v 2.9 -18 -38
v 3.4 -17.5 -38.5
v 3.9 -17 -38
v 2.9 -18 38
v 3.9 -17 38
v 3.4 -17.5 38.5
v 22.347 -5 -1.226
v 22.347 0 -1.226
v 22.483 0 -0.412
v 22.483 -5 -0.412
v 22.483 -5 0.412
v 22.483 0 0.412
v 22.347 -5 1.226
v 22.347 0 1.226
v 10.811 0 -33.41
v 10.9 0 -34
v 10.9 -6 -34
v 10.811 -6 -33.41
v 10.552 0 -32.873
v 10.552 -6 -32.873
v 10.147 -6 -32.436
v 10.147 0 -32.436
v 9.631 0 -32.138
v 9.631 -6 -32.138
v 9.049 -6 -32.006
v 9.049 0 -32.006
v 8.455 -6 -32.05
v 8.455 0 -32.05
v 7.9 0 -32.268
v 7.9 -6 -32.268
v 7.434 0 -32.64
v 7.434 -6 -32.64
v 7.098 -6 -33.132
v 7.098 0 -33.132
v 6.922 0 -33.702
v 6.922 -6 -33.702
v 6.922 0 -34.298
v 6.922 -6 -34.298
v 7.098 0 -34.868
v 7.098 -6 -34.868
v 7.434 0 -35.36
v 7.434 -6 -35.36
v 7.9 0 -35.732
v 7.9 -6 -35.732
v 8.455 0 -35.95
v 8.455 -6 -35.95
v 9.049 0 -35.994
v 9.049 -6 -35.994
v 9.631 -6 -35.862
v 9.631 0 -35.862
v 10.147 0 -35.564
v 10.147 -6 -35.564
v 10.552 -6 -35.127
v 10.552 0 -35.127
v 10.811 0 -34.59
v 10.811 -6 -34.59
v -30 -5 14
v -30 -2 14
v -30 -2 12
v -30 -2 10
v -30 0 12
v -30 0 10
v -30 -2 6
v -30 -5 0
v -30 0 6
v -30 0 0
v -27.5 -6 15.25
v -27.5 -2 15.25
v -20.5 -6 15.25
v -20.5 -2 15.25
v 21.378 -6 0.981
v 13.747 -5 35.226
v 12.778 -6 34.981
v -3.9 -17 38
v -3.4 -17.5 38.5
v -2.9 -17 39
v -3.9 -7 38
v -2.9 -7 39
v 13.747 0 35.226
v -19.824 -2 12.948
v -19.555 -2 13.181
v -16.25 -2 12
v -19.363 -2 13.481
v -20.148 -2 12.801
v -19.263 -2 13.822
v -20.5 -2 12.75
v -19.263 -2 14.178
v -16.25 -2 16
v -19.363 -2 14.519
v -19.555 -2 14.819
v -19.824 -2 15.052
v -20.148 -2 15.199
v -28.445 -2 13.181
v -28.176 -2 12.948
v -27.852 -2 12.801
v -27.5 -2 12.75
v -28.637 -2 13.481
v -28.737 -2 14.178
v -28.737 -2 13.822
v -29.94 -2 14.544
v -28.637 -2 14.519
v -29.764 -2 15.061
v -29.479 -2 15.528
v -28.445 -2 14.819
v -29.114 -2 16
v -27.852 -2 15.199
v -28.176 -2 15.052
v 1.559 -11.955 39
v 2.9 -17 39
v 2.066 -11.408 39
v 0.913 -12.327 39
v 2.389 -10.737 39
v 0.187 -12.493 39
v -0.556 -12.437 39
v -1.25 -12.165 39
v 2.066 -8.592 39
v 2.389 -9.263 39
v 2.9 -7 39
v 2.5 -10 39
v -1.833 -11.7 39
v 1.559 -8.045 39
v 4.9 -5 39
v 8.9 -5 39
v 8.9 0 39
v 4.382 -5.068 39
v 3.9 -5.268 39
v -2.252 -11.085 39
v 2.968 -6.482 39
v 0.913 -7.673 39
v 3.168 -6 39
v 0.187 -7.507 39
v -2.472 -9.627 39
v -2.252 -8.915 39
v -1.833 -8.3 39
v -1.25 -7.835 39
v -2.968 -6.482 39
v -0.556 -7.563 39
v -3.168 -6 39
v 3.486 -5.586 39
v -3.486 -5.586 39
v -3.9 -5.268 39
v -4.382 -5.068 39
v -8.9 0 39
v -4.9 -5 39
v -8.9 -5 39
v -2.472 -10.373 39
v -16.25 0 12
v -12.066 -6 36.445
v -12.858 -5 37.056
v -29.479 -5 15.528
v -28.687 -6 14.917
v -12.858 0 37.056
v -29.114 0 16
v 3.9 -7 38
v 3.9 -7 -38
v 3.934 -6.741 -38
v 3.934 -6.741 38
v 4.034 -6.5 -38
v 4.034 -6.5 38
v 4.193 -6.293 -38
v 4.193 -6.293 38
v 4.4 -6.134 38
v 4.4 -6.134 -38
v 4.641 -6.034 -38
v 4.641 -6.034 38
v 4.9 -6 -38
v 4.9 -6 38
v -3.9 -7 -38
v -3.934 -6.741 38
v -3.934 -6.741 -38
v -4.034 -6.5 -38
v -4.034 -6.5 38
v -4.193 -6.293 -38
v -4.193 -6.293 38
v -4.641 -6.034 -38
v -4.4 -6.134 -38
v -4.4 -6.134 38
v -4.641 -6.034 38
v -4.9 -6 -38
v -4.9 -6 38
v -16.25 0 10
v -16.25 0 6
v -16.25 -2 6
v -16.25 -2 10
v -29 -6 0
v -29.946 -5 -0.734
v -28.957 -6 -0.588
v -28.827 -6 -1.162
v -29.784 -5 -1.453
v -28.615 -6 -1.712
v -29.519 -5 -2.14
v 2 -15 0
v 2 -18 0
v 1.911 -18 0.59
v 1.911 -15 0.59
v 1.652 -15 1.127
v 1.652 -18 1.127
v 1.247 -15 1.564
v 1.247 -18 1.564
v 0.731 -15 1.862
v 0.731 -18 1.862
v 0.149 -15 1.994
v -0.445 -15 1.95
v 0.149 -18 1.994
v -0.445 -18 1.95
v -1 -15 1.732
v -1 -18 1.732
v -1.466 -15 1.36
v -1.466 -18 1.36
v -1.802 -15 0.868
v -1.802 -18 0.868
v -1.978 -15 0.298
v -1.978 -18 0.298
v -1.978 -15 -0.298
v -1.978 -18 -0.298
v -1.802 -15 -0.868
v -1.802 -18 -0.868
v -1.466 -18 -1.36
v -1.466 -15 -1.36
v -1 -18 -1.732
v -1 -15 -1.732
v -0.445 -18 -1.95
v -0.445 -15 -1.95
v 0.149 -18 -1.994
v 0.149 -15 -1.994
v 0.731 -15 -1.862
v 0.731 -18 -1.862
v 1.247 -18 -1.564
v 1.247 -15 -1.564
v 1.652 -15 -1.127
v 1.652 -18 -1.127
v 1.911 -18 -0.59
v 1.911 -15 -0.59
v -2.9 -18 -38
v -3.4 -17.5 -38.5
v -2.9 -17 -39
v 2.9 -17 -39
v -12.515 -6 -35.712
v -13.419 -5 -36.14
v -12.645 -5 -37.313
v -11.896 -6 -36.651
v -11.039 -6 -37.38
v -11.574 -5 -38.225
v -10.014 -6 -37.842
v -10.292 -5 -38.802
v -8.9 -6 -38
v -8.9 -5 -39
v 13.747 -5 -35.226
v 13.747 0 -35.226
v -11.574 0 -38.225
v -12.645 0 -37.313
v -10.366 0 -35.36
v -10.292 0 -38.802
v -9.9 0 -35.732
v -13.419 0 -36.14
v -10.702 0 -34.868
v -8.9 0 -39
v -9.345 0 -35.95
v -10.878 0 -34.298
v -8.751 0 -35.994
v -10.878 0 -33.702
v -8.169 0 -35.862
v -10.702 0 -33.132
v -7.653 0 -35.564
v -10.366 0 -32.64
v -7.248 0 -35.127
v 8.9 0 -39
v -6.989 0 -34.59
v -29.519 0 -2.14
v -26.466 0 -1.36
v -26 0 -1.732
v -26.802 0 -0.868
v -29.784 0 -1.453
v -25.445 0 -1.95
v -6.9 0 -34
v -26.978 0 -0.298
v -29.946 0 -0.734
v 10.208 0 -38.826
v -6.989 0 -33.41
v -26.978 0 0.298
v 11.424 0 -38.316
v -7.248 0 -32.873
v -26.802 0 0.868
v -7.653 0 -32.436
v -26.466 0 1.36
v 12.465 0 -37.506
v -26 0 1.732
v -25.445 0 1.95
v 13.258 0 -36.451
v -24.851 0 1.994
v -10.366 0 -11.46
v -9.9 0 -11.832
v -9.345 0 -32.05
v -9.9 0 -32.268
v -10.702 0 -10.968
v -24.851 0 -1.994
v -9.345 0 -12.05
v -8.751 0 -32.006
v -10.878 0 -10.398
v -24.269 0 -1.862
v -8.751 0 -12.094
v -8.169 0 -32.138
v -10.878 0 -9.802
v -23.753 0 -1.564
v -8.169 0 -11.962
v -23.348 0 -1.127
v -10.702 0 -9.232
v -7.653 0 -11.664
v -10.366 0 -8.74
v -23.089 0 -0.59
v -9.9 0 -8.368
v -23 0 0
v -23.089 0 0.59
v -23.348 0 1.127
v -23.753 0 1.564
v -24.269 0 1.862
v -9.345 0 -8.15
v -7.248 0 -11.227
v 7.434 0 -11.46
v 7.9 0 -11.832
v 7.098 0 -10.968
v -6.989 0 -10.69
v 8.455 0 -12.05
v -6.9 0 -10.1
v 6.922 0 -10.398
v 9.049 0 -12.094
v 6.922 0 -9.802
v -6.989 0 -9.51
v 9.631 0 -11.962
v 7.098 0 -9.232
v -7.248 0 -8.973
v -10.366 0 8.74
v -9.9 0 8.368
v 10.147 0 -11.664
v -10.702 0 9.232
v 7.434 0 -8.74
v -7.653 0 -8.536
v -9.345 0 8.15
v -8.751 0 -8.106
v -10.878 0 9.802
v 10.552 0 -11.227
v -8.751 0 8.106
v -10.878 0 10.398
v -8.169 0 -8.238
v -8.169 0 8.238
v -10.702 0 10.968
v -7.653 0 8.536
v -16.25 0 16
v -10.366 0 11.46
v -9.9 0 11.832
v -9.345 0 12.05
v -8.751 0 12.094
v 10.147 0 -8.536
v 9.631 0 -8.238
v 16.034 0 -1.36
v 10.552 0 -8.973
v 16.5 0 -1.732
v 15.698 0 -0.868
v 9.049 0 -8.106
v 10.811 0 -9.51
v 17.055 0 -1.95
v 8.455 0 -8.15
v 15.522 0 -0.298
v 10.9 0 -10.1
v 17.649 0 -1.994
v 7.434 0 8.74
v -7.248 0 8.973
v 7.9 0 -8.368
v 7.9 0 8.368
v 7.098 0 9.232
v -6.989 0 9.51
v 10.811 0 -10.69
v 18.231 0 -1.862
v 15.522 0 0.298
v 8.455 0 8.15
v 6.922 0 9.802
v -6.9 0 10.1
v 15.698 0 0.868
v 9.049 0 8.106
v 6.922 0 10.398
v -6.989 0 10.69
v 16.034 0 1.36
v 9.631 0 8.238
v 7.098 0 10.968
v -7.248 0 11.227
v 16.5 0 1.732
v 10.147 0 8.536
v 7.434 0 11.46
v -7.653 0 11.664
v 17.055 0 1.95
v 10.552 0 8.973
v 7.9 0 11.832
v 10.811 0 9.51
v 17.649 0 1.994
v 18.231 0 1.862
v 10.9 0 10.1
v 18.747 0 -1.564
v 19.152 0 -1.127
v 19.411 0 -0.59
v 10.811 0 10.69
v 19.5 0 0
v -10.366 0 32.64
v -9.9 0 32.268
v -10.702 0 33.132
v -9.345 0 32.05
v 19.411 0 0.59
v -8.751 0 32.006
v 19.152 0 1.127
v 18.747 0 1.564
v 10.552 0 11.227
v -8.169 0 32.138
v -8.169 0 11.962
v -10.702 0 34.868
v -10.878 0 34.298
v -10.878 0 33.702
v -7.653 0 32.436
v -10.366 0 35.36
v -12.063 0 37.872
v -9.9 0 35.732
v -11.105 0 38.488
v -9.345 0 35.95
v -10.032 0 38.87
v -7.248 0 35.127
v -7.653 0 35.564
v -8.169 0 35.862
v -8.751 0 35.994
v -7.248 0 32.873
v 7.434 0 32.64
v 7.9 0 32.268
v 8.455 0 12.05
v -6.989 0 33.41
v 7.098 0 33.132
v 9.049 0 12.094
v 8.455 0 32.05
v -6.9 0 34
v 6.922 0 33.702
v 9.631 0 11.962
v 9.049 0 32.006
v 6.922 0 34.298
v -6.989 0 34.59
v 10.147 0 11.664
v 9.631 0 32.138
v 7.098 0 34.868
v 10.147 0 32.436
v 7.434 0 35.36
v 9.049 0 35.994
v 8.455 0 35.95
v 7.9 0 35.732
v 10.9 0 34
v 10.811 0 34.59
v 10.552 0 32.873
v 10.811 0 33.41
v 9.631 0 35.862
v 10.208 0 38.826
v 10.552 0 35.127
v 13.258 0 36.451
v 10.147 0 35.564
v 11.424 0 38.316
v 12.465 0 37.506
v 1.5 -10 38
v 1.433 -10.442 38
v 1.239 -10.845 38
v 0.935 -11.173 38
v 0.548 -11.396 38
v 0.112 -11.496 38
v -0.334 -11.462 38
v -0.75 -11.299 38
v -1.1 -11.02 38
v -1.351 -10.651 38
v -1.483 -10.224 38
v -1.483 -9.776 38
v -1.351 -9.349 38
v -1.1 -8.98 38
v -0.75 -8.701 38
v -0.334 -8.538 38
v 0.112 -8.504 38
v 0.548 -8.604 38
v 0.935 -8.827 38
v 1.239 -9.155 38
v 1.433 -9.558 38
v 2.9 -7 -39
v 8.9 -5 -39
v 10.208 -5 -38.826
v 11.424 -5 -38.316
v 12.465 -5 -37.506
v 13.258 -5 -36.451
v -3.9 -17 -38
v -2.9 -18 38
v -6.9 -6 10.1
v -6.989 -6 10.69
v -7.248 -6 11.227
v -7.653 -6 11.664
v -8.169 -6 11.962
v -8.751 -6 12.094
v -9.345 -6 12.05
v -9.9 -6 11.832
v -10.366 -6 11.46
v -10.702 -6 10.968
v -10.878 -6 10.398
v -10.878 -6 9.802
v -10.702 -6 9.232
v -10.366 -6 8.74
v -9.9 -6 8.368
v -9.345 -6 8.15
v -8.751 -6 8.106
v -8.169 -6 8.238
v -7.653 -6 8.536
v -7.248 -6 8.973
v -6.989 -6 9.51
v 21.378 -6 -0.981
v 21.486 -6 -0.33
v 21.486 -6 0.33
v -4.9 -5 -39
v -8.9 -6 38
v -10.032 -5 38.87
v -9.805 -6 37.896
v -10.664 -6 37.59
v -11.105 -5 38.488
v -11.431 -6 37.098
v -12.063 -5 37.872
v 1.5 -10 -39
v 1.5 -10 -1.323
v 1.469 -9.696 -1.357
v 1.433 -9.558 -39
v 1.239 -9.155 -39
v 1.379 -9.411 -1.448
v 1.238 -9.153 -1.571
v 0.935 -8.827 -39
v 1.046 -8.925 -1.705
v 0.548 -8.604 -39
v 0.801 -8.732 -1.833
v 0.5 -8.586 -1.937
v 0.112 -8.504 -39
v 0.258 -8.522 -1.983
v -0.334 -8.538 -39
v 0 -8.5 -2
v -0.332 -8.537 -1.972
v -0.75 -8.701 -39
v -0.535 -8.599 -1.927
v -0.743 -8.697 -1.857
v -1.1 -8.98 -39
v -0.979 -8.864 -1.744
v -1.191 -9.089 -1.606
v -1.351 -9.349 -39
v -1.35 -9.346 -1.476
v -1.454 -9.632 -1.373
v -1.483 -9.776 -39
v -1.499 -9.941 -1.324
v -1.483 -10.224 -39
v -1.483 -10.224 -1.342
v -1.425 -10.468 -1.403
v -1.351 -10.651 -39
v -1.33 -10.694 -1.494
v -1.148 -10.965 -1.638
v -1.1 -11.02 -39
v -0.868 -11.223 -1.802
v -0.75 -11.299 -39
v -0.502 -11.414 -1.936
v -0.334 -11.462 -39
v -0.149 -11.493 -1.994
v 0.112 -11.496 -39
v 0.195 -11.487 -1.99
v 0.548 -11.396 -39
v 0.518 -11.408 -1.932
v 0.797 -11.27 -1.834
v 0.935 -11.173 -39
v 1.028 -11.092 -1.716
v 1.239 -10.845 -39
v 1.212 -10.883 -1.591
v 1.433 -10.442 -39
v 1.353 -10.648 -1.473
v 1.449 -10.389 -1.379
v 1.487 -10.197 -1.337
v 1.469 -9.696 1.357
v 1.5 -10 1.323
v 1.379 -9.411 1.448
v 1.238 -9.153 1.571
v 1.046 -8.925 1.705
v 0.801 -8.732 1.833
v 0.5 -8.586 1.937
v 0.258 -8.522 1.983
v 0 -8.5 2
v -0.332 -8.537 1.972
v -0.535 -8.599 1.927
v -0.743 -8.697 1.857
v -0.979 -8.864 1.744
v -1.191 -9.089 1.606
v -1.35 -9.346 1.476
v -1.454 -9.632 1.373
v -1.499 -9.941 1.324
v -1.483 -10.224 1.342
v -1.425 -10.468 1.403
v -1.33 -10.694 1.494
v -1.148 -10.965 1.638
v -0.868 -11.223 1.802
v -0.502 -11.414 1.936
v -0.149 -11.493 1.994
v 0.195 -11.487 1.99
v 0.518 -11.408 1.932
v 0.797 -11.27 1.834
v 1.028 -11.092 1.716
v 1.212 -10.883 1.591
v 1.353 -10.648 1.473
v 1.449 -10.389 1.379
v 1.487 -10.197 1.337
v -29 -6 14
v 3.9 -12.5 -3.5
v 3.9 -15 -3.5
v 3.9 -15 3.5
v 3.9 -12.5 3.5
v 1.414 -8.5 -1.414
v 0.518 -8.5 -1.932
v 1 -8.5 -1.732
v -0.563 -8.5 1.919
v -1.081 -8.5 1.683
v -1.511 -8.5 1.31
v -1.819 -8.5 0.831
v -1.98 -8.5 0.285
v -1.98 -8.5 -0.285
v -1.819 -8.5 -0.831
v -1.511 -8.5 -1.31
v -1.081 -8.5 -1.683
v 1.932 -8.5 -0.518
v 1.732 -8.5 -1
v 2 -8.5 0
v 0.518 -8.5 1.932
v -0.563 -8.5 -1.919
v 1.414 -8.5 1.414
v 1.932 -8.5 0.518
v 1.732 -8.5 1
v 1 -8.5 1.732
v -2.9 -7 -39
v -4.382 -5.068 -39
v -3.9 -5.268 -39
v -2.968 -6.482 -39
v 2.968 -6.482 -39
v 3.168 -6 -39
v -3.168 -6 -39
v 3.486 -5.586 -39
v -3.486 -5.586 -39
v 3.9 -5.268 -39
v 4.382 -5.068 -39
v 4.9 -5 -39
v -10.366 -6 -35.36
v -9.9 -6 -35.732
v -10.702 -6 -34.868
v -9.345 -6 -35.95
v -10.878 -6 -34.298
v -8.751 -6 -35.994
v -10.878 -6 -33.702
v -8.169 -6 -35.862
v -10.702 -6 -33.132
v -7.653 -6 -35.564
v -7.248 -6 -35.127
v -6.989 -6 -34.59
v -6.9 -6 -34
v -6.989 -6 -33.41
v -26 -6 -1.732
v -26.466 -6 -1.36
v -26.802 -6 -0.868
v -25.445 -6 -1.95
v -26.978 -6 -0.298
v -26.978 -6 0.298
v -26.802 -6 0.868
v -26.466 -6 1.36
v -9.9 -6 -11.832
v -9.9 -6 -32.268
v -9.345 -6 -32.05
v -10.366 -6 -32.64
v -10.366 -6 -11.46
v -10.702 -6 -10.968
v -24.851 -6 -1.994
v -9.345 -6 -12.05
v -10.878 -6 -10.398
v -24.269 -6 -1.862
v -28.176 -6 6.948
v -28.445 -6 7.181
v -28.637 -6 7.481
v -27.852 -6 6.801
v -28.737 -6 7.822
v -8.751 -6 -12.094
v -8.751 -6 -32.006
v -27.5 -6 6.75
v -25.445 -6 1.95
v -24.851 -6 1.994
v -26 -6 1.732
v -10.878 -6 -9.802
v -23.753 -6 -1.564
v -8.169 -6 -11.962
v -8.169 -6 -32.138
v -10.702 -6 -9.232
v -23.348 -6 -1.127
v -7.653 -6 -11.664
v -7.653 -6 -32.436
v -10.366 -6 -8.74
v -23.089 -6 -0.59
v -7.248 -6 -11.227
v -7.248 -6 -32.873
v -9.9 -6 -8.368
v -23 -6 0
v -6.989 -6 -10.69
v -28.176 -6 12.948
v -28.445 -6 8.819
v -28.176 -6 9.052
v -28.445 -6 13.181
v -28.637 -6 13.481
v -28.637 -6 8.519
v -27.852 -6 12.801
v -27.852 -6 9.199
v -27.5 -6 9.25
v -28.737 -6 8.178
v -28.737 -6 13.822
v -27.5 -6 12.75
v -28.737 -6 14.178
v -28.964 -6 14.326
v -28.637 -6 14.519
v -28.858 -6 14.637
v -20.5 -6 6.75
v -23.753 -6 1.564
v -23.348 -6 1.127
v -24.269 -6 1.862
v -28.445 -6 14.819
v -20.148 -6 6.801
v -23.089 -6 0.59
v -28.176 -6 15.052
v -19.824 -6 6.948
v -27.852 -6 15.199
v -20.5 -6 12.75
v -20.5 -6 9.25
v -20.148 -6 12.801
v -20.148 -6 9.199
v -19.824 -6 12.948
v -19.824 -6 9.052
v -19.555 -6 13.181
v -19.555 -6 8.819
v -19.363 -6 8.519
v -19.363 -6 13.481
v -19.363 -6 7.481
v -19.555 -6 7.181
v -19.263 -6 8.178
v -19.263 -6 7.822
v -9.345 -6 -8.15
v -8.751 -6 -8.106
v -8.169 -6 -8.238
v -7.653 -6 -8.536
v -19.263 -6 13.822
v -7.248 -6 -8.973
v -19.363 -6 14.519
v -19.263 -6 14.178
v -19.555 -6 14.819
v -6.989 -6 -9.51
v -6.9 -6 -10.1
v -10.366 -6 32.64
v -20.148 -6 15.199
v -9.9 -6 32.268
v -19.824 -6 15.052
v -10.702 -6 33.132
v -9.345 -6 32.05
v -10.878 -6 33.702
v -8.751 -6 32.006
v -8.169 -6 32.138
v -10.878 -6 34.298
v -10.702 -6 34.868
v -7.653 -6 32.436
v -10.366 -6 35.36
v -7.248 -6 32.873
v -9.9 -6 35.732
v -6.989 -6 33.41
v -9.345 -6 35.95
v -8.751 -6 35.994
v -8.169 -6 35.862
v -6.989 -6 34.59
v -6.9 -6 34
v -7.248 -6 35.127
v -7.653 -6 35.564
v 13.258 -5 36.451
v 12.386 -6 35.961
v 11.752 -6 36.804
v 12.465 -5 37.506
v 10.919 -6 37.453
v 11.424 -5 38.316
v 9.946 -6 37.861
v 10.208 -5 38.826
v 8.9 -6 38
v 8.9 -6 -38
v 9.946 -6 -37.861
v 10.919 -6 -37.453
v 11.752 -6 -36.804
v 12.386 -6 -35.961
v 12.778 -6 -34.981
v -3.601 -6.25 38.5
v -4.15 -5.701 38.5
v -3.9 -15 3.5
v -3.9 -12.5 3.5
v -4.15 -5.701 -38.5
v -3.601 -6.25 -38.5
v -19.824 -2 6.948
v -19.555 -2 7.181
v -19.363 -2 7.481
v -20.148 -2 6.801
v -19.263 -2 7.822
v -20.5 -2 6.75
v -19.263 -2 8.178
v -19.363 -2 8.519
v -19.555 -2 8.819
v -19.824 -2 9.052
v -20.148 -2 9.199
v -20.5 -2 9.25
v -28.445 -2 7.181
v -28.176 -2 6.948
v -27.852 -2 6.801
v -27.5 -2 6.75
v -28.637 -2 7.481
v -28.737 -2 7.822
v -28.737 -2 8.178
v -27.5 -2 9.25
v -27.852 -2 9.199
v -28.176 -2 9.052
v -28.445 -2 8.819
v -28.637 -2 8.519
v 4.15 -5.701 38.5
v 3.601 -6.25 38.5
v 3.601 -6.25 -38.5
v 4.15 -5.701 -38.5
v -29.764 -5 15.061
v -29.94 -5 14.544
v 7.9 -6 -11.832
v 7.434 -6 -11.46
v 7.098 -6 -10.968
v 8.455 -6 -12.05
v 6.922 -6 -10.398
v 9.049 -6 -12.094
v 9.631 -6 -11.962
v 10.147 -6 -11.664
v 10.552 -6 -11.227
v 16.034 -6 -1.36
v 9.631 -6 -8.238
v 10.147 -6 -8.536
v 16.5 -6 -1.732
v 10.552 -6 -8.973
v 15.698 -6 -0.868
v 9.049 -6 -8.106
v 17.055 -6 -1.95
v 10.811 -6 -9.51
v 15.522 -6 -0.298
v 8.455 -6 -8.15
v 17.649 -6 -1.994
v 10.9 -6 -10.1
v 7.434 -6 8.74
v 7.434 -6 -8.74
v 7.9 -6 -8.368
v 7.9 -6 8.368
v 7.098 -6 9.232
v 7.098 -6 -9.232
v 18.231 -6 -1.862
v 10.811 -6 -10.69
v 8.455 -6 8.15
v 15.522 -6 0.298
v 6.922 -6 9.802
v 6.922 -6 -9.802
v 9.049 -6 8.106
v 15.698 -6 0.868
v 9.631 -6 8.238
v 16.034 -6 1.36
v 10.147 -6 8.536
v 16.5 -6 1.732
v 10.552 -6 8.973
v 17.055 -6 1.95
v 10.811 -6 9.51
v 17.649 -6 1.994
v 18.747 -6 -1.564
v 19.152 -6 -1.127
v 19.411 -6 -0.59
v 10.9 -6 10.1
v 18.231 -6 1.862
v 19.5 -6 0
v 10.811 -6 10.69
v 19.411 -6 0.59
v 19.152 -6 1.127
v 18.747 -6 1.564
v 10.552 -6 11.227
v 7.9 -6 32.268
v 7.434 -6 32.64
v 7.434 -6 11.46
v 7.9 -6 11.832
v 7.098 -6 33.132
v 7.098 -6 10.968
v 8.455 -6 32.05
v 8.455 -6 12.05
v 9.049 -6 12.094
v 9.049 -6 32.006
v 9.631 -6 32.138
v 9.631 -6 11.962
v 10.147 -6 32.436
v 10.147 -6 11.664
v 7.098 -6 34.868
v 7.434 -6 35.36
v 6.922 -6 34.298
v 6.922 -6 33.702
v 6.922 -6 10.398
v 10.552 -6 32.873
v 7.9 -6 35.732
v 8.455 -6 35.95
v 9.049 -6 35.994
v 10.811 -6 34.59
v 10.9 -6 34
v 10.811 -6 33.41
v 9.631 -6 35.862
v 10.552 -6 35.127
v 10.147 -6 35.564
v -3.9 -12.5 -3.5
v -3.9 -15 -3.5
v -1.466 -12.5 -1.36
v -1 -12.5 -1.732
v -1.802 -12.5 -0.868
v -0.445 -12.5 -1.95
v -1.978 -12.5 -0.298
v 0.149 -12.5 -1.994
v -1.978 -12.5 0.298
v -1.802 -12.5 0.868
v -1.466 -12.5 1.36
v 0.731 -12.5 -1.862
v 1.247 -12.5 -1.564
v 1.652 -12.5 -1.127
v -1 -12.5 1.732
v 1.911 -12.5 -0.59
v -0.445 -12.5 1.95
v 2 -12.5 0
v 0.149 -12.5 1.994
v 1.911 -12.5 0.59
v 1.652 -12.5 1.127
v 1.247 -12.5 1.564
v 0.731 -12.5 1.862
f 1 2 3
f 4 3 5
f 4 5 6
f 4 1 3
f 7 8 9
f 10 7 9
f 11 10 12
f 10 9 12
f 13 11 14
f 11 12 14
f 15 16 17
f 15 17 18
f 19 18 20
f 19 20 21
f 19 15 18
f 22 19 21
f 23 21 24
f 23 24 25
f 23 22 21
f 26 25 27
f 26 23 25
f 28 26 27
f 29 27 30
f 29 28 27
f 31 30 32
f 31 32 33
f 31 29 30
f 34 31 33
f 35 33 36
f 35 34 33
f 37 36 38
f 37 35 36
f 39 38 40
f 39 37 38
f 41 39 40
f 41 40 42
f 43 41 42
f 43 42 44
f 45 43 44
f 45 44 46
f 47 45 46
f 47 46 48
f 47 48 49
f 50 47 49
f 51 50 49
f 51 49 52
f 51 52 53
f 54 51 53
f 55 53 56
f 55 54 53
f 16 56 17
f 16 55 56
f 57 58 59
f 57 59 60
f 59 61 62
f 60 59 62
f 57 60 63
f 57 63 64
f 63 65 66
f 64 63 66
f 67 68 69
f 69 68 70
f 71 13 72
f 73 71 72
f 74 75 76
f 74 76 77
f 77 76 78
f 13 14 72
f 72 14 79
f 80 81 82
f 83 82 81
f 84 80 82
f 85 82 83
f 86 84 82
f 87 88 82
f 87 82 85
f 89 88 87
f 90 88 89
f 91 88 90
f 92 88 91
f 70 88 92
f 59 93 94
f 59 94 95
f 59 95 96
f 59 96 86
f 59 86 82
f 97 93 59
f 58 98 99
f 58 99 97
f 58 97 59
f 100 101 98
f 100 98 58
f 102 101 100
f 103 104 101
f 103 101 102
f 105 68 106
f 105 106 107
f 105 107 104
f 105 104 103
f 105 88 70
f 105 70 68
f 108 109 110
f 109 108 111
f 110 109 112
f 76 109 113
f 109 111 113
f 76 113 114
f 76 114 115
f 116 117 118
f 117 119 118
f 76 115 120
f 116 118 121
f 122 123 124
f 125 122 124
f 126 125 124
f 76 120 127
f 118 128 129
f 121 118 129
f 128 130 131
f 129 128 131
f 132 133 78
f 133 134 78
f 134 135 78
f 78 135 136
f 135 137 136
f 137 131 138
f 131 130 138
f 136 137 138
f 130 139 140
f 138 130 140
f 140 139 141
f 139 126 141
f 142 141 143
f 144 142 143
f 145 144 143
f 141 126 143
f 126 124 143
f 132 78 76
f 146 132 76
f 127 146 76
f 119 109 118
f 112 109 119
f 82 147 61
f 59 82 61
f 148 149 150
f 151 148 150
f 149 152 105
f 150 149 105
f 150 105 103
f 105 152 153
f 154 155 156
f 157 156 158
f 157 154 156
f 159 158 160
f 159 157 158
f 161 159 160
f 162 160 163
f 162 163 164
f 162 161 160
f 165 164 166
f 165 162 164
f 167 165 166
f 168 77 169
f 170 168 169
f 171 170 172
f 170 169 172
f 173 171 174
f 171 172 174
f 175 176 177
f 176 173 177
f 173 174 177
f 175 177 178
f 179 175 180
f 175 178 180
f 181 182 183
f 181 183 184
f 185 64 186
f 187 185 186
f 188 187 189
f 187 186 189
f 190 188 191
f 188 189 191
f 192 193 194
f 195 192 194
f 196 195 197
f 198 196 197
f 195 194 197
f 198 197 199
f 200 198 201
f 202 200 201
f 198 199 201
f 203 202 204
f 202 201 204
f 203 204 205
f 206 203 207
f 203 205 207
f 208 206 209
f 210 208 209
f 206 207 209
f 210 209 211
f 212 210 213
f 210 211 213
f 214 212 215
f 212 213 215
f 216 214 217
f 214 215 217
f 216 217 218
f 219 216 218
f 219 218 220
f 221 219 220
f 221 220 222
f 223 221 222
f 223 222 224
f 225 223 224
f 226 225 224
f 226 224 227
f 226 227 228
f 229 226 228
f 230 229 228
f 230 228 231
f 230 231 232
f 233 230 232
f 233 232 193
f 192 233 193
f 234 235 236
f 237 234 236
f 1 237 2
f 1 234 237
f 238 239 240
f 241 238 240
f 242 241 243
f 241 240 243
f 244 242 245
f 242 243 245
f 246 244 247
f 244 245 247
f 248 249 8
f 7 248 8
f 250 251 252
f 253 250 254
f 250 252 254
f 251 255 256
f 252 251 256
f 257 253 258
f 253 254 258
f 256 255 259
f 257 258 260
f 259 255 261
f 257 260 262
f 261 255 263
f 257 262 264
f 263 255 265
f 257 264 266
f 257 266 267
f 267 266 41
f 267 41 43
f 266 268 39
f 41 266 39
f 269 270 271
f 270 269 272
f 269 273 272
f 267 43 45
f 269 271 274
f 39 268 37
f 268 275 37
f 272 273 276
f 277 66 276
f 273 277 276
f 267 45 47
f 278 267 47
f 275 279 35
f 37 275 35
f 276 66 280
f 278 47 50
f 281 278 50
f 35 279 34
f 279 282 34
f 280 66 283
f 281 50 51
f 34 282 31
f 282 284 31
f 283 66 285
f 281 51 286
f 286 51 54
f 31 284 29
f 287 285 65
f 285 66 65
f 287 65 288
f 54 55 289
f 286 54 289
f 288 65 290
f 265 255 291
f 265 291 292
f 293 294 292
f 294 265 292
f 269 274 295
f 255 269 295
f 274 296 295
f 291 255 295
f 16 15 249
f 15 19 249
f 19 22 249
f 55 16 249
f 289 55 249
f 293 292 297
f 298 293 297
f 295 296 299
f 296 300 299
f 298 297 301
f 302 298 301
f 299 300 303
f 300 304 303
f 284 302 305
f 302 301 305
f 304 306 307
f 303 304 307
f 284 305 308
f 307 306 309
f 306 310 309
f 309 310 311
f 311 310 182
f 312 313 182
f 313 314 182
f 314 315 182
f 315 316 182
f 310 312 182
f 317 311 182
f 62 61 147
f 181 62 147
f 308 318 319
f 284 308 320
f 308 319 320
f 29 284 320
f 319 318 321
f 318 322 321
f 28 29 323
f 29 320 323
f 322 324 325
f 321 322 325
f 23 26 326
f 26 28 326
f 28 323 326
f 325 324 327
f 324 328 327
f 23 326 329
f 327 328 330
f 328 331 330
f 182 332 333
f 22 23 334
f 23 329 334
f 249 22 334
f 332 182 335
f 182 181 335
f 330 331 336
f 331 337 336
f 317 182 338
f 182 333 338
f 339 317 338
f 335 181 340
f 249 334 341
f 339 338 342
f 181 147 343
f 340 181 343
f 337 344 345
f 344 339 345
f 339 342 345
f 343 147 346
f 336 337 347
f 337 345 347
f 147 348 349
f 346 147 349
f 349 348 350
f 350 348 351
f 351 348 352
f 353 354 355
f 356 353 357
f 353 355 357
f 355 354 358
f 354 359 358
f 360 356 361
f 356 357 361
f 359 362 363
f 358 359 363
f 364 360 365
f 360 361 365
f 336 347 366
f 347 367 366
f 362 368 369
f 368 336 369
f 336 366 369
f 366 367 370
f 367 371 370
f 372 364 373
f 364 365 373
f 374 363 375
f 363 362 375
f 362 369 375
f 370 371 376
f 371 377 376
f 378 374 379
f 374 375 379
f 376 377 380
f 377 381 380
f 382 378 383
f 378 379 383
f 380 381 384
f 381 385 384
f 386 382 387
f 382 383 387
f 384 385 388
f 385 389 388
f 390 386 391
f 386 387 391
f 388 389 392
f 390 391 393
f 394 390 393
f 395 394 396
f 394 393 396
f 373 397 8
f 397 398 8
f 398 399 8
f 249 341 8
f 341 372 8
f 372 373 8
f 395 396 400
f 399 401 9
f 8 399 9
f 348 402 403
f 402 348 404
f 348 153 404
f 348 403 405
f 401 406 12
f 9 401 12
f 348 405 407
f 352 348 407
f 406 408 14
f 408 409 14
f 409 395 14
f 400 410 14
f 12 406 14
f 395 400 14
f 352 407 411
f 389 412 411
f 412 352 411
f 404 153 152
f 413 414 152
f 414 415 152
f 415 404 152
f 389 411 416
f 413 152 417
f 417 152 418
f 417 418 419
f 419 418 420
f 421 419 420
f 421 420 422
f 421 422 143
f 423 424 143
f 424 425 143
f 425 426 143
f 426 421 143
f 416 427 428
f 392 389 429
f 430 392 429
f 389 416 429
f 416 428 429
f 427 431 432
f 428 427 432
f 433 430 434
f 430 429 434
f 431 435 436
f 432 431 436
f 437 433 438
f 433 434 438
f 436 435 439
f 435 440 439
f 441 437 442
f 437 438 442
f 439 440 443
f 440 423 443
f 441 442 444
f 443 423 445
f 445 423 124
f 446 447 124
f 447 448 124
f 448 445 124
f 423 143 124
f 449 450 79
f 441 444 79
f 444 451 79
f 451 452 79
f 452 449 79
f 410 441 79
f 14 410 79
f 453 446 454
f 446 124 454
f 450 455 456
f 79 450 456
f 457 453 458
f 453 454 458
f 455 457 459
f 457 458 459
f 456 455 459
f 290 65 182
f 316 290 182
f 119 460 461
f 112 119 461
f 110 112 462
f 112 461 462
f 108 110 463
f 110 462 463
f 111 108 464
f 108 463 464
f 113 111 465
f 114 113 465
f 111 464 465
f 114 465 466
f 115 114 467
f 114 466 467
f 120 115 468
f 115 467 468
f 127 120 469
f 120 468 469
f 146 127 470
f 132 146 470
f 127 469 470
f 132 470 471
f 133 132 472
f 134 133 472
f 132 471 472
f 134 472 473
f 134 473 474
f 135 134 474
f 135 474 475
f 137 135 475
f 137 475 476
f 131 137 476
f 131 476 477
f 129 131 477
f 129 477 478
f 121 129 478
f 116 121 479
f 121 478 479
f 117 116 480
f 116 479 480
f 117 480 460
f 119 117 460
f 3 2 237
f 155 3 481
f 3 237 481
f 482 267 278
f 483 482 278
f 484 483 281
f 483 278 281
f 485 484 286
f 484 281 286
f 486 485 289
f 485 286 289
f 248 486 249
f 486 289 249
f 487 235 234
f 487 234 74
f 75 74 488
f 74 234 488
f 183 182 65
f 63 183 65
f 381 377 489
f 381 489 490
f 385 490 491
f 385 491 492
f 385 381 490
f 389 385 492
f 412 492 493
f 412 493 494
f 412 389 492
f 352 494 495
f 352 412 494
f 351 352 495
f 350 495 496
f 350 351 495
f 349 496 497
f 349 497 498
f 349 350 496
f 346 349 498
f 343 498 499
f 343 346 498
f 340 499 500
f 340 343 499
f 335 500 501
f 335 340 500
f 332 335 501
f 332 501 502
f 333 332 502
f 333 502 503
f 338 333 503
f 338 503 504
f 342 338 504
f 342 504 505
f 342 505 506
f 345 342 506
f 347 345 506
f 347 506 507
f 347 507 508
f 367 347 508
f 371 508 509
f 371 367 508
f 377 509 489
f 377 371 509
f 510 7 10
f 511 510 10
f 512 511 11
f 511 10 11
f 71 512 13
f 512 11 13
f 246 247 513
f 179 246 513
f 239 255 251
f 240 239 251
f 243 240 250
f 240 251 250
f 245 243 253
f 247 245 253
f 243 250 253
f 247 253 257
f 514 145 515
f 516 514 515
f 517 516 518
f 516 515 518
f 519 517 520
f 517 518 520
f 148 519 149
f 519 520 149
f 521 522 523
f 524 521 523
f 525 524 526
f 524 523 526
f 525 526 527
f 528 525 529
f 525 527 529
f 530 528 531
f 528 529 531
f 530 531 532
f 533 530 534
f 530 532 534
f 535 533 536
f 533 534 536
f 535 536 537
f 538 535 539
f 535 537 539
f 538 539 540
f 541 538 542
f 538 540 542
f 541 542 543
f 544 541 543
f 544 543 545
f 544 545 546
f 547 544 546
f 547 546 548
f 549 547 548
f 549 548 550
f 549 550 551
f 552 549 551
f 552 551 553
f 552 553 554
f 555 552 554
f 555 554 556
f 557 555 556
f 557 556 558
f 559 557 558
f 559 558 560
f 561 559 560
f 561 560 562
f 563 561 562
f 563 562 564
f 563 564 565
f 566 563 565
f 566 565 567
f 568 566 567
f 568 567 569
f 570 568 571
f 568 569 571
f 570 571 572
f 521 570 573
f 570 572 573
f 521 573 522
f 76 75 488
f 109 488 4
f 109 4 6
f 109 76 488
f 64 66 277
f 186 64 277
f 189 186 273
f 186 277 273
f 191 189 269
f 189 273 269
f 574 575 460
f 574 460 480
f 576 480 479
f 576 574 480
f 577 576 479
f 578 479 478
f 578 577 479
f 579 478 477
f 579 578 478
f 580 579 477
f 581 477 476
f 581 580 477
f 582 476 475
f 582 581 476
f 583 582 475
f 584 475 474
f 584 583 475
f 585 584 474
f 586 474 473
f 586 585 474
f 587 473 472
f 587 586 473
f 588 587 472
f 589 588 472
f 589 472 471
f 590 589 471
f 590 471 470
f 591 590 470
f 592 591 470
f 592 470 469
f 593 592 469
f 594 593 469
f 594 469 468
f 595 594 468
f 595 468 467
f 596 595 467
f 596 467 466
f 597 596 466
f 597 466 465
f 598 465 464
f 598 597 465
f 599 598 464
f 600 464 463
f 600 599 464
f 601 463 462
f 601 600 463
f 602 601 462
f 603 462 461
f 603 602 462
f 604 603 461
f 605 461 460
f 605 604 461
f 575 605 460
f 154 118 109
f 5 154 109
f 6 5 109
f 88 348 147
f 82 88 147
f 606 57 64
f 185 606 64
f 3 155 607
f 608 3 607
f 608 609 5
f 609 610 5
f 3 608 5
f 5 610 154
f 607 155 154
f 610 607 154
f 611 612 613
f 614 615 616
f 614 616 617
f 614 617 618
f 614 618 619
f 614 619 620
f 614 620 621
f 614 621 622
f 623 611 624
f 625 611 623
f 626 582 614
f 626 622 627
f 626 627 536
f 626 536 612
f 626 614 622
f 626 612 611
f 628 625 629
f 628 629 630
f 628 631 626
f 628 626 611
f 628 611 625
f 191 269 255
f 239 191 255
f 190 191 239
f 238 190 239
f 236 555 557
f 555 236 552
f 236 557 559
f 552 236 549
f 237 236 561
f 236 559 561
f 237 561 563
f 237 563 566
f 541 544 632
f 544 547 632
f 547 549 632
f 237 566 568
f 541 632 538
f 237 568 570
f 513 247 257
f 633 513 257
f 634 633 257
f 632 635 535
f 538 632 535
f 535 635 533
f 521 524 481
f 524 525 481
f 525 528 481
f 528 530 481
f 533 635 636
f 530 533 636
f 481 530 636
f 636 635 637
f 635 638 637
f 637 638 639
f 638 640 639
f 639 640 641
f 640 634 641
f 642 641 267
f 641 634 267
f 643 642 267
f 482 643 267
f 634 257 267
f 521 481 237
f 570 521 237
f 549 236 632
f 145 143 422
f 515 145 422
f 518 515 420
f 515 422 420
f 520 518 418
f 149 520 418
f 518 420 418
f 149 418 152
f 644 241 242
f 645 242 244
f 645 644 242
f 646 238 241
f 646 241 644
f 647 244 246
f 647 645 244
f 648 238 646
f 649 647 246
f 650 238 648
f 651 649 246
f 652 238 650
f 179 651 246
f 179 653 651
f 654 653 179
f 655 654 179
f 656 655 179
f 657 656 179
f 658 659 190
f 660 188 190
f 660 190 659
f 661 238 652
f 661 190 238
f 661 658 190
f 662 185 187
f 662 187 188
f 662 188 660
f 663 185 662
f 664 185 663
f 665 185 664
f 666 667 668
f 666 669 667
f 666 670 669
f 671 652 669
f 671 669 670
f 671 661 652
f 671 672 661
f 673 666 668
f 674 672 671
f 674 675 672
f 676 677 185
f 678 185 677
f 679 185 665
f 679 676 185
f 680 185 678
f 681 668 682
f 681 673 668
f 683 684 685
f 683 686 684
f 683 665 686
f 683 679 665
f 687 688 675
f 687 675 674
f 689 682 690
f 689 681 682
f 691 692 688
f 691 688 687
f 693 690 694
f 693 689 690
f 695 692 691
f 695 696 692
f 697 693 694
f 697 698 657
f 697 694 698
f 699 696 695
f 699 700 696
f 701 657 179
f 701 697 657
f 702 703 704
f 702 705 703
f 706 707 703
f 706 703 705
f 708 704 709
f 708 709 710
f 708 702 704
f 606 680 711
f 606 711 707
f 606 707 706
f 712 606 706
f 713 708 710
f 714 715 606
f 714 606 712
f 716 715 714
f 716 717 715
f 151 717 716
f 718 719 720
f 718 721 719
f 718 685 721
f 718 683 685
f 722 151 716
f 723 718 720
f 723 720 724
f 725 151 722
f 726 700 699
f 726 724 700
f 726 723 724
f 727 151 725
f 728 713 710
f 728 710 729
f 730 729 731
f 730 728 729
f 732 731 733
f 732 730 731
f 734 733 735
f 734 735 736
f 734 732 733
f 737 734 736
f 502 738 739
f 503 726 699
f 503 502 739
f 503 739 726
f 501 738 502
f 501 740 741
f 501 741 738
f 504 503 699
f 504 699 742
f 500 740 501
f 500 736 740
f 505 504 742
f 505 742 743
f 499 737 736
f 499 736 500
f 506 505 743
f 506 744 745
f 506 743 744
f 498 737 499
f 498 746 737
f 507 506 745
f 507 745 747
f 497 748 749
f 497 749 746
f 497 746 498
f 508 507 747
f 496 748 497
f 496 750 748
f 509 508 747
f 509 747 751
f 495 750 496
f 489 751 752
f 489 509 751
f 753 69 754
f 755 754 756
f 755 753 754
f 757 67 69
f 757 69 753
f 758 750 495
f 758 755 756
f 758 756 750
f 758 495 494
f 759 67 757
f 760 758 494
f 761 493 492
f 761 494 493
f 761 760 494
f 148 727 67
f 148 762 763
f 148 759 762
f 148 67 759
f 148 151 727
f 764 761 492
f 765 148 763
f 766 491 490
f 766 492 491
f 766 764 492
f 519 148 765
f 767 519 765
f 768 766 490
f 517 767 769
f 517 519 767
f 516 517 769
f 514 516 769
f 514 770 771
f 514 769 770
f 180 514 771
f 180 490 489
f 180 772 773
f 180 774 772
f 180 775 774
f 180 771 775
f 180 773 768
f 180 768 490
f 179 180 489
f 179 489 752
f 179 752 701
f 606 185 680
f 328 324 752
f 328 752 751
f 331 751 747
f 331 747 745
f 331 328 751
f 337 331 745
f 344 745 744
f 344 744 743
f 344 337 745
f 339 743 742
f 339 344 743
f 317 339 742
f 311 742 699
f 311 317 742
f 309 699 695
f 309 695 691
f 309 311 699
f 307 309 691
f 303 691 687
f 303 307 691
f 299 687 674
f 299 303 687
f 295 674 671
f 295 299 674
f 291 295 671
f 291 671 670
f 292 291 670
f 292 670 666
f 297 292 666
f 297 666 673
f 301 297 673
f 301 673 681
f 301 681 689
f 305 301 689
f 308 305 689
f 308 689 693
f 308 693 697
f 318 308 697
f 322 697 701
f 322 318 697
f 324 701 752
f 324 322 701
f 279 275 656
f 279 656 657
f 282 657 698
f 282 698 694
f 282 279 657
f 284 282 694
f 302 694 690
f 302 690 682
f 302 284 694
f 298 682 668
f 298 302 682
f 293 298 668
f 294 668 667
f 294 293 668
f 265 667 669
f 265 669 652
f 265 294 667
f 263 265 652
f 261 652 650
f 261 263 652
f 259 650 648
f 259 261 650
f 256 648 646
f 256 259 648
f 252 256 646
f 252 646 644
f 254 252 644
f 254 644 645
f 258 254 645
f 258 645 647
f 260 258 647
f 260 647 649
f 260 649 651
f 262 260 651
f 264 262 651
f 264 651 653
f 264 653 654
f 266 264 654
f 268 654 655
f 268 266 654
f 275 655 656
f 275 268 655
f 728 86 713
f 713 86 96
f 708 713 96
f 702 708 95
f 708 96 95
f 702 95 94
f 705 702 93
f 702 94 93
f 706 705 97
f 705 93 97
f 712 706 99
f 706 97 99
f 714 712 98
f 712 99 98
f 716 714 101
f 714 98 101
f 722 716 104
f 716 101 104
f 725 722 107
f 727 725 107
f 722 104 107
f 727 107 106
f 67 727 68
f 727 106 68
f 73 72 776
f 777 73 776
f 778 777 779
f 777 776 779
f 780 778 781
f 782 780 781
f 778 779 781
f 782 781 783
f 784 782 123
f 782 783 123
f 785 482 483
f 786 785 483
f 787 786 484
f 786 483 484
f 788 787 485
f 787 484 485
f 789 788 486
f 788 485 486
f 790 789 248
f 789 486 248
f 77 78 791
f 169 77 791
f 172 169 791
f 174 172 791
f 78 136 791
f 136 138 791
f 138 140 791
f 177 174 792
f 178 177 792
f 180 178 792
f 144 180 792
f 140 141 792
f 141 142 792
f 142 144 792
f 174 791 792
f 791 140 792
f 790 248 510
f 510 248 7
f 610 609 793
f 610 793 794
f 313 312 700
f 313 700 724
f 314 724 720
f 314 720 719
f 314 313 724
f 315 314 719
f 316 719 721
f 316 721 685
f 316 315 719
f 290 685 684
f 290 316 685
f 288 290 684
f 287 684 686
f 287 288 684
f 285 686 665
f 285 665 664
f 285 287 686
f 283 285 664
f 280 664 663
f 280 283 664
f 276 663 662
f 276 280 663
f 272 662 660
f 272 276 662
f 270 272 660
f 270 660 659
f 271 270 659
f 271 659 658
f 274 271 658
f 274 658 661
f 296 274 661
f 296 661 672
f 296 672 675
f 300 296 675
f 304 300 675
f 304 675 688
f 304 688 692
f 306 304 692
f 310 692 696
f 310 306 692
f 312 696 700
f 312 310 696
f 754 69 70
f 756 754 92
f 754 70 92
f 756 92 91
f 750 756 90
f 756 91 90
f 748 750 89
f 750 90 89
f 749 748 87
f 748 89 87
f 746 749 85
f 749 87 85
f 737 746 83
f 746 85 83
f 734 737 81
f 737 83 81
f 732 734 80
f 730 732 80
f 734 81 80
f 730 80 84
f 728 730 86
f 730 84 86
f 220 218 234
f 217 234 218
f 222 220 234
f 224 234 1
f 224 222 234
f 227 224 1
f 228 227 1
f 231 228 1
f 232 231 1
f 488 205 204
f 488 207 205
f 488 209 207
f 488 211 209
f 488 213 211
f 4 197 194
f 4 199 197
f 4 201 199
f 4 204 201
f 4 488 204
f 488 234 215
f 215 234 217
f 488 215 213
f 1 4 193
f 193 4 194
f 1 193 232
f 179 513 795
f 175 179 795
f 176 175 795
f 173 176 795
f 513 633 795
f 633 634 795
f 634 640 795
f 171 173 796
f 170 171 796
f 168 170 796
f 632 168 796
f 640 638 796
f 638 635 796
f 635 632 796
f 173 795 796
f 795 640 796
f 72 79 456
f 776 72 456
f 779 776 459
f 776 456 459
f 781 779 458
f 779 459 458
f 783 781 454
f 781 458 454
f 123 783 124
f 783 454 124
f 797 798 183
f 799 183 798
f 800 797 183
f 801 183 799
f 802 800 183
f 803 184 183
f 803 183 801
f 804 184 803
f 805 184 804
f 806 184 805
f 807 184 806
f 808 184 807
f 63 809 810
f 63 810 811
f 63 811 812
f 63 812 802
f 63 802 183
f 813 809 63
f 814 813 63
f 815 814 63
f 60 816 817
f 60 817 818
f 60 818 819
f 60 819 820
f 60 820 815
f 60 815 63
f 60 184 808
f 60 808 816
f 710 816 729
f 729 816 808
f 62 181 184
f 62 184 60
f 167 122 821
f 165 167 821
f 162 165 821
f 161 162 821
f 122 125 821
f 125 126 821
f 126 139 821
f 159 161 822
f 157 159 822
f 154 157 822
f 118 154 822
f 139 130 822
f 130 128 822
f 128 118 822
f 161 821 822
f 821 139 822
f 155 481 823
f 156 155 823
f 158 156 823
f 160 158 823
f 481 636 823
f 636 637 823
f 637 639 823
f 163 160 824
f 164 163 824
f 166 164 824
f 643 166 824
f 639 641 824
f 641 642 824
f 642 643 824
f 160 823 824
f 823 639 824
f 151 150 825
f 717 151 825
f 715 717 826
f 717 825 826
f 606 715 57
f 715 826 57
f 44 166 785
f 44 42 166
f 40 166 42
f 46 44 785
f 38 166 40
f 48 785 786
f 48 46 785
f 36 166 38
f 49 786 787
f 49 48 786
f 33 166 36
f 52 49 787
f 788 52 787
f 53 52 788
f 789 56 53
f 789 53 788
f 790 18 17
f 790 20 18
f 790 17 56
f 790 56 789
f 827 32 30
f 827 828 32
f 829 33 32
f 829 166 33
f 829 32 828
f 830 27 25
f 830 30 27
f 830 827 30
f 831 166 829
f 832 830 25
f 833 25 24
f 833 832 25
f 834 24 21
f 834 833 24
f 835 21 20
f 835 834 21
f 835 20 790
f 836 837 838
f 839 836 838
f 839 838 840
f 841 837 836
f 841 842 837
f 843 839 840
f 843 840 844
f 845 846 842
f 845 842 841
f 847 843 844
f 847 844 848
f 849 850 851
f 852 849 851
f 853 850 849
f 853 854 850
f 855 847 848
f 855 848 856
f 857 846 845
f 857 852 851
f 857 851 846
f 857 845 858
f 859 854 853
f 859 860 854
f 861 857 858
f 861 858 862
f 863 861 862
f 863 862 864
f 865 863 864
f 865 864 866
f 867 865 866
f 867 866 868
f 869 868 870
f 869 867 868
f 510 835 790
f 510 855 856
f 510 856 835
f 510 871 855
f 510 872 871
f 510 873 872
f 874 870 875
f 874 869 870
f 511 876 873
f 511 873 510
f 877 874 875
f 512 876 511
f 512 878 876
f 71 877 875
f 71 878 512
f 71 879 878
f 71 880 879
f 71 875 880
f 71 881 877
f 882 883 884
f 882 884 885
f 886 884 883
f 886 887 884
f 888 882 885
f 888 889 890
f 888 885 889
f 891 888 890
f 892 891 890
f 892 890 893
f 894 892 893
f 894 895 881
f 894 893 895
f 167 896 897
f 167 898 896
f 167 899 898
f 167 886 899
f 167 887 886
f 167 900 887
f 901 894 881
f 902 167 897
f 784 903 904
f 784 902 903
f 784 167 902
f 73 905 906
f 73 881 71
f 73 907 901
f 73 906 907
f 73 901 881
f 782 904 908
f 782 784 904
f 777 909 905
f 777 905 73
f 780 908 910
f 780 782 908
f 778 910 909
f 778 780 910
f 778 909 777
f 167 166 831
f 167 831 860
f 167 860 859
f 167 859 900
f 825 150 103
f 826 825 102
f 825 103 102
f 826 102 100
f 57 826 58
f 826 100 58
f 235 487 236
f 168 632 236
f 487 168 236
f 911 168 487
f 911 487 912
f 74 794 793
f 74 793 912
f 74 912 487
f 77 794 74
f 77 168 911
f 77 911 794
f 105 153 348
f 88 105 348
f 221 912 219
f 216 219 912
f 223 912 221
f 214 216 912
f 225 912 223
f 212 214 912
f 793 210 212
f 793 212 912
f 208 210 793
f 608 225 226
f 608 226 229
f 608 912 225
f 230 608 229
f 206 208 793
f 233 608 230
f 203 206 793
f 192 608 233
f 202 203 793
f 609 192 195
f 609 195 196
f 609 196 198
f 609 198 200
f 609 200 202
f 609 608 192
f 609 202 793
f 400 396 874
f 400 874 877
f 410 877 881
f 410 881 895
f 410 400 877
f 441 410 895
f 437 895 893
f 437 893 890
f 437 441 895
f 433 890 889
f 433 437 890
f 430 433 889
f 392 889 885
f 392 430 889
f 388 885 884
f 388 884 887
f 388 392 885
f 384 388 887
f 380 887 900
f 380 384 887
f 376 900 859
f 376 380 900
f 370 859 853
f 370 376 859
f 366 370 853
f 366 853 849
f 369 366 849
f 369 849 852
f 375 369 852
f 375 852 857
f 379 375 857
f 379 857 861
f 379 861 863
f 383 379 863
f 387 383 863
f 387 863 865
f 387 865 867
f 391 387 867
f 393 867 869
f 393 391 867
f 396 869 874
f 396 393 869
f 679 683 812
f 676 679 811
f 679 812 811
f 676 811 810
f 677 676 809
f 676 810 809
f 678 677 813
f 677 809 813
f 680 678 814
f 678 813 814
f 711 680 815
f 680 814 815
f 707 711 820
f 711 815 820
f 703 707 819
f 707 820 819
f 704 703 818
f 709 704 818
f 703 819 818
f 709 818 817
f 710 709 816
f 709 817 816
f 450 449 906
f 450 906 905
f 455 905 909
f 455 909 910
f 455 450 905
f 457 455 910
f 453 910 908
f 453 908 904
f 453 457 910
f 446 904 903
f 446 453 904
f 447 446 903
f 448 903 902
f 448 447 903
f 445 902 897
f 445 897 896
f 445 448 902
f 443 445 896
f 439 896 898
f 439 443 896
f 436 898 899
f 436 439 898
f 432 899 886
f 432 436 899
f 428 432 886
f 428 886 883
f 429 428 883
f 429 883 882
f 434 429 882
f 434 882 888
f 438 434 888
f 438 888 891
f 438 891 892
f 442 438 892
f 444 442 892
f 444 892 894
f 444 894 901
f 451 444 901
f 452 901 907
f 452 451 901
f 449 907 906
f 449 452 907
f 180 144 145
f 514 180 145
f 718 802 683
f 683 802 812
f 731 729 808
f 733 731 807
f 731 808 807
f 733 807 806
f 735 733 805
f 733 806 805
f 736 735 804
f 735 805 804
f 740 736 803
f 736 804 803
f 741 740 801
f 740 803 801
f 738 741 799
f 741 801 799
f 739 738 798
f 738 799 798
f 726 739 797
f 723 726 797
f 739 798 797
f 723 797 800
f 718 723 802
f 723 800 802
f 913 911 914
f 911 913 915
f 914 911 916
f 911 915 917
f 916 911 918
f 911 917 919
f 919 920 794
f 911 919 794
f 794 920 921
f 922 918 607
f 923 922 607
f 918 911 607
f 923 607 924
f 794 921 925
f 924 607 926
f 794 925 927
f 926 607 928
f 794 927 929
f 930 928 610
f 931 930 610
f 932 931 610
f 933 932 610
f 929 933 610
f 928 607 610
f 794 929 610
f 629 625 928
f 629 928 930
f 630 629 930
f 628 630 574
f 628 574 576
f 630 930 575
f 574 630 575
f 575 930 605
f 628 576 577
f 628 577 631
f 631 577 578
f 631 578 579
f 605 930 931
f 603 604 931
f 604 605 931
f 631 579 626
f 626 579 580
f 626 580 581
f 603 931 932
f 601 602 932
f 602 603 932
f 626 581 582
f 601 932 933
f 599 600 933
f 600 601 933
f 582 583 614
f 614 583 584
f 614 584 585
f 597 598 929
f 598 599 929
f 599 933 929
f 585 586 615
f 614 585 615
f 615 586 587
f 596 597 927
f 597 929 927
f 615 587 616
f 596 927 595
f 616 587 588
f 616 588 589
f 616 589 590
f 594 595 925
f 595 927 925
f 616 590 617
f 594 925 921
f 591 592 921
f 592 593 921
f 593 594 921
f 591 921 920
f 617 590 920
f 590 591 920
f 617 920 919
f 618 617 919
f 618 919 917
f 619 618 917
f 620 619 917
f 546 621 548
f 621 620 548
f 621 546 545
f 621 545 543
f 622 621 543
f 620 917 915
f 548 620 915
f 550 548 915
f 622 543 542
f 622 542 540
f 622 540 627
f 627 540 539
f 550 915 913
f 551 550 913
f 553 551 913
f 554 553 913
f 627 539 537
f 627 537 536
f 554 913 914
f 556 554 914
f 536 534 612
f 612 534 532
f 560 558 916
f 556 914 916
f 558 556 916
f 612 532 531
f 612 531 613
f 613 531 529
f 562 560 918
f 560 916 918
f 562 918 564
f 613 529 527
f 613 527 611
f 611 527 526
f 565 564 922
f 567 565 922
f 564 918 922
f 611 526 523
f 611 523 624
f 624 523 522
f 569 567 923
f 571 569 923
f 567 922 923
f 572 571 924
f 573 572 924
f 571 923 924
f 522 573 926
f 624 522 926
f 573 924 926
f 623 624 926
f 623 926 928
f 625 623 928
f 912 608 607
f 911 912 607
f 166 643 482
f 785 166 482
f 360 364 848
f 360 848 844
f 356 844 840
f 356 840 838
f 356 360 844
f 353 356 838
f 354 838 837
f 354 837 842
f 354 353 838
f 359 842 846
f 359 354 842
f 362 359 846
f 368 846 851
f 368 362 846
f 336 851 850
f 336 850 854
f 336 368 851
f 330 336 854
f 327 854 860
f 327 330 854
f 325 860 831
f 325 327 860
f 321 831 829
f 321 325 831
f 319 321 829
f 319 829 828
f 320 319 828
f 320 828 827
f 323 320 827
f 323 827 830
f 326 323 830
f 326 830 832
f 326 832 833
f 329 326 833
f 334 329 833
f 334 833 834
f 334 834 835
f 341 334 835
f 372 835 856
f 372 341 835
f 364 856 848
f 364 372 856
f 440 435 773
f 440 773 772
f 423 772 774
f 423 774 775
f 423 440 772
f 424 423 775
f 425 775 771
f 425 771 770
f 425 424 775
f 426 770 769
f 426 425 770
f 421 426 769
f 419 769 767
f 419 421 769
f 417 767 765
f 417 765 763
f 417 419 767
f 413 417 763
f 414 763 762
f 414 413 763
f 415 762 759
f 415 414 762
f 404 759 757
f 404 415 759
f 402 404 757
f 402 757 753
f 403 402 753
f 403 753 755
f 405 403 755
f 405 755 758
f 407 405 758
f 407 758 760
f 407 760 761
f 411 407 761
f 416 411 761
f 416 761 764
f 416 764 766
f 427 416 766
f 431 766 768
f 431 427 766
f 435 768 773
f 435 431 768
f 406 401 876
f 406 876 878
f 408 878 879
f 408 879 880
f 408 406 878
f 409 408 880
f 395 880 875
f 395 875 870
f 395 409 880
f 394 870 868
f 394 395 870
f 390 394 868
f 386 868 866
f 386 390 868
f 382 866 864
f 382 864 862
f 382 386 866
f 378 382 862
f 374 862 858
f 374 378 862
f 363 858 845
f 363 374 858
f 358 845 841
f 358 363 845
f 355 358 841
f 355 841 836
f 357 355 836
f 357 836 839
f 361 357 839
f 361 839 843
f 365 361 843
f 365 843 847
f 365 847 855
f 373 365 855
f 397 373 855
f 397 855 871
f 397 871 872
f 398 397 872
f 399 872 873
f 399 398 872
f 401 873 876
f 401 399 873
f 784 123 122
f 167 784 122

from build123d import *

# Parameters (mm, degrees)
F0_R          = 2
F1_DEPTH      = 6
F2_W          = 7.8
F2_H          = 78
F3_DEPTH      = 12
F4_R          = 2
F5_DEPTH      = 12
F6_W          = 2.5
F6_H          = 7
F7_DEPTH      = 33.901
F8_R          = 1.5
F9_DEPTH      = 39.001
F9_DEPTH_BACK = 39.001
F10_DEPTH     = 2.5
F11_SIZE      = 1
F12_R         = 1
F13_SIZE      = 1
F14_SIZE      = 1
F15_W         = 13.75
F15_H         = 4
F16_DEPTH     = 2


# Not quite as in the source:
# - a feature names something its author has since deleted; it is built from what else it names


with BuildPart() as f1:
    # F0 (on Front) → F1 (new body)
    with BuildSketch(Plane.XZ):
        with BuildLine():
            Line((22.3473393815, 1.2260917259), (13.7473393815, 35.2260917259))
            ThreePointArc((13.7473393815, 35.2260917259), (11.9716071828, 37.9452793709), (8.9, 39))
            Line((8.9, 39), (-8.9, 39))
            ThreePointArc((-8.9, 39), (-11.1047505583, 38.4876580725), (-12.8576666563, 37.0556299903))
            Line((-12.8576666563, 37.0556299903), (-29.4788333281, 15.5278149952))
            ThreePointArc((-29.4788333281, 15.5278149952), (-29.8661237626, 14.8071296921), (-30, 14))
            Line((-30, 14), (-30, 0))
            ThreePointArc((-30, 0), (-29.8782578321, -1.0966314436), (-29.5189597908, -2.1398603715))
            Line((-29.5189597908, -2.1398603715), (-13.4189597908, -36.1398603715))
            ThreePointArc((-13.4189597908, -36.1398603715), (-11.5740136632, -38.2248847237), (-8.9, -39))
            Line((-8.9, -39), (8.9, -39))
            ThreePointArc((8.9, -39), (11.9716071828, -37.9452793709), (13.7473393815, -35.2260917259))
            Line((13.7473393815, -35.2260917259), (22.3473393815, -1.2260917259))
            ThreePointArc((22.3473393815, -1.2260917259), (22.5, 0), (22.3473393815, 1.2260917259))
        make_face()
        with Locations((-8.9, -34)):
            Circle(F0_R, mode=Mode.SUBTRACT)
        with Locations((-8.9, -10.1)):
            Circle(F0_R, mode=Mode.SUBTRACT)
        with Locations((8.9, -34)):
            Circle(F0_R, mode=Mode.SUBTRACT)
        with Locations((8.9, -10.1)):
            Circle(F0_R, mode=Mode.SUBTRACT)
        with Locations((-25, 0)):
            Circle(F0_R, mode=Mode.SUBTRACT)
        with BuildLine():
            ThreePointArc((-20.5, 9.25), (-19.25, 8), (-20.5, 6.75))
            Line((-20.5, 6.75), (-27.5, 6.75))
            ThreePointArc((-27.5, 6.75), (-28.75, 8), (-27.5, 9.25))
            Line((-27.5, 9.25), (-20.5, 9.25))
        make_face(mode=Mode.SUBTRACT)
        with BuildLine():
            ThreePointArc((-27.5, 12.75), (-28.75, 14), (-27.5, 15.25))
            Line((-27.5, 15.25), (-20.5, 15.25))
            ThreePointArc((-20.5, 15.25), (-19.25, 14), (-20.5, 12.75))
            Line((-20.5, 12.75), (-27.5, 12.75))
        make_face(mode=Mode.SUBTRACT)
        with Locations((-8.9, 10.1)):
            Circle(F0_R, mode=Mode.SUBTRACT)
        with Locations((-8.9, 34)):
            Circle(F0_R, mode=Mode.SUBTRACT)
        with Locations((8.9, 10.1)):
            Circle(F0_R, mode=Mode.SUBTRACT)
        with Locations((17.5, 0)):
            Circle(F0_R, mode=Mode.SUBTRACT)
        with Locations((8.9, 34)):
            Circle(F0_R, mode=Mode.SUBTRACT)
    extrude(amount=F1_DEPTH)

    # F2 (on face) → F3 (join)
    with BuildSketch(Plane.XZ.offset(6)):
        Rectangle(F2_W, F2_H)
    extrude(amount=F3_DEPTH)

    # F4 (on face) → F5 (cut, through all)
    with BuildSketch(Plane.XZ.offset(18)):
        Circle(F4_R)
    extrude(amount=-F5_DEPTH, mode=Mode.SUBTRACT)

    # F6 (on face) → F7 (cut, through all)
    with BuildSketch(Plane.YZ.offset(3.9)):
        with Locations((-13.75, 0)):
            Rectangle(F6_W, F6_H)
    extrude(amount=-F7_DEPTH, mode=Mode.SUBTRACT)

    # F8 (on Top) → F9 (cut, two sides)
    with BuildSketch(Plane.XY) as f9_sk:
        with Locations((0, -10)):
            Circle(F8_R)
    extrude(amount=-F9_DEPTH, mode=Mode.SUBTRACT)
    extrude(f9_sk.sketch, amount=F9_DEPTH_BACK, mode=Mode.SUBTRACT)

    # F10 (add): a face of the model
    f10_faces = [f1.faces().sort_by_distance(p)[0] for p in [
        (0, -6, 0),
    ]]
    extrude(f10_faces, amount=F10_DEPTH)

    # F11
    f11_edges = [f1.edges().sort_by_distance(p)[0] for p in [
        (3.9, -18, 0),
        (-3.9, -18, 0),
    ]]
    chamfer(f11_edges, length=F11_SIZE)

    # F12
    f12_edges = [f1.edges().sort_by_distance(p)[0] for p in [
        (-3.9, -6, 0),
        (3.9, -6, 0),
    ]]
    fillet(f12_edges, radius=F12_R)

    # F13 (call 1 of 4: OpenCascade refuses the feature's edges together)
    f13_edges = [f1.edges().sort_by_distance(p)[0] for p in [
        (18.047339, -6, 18.226092),
    ]]
    chamfer(f13_edges, length=F13_SIZE)

    # F13#2 (call 2 of 4)
    f13_2_edges = [f1.edges().sort_by_distance(p)[0] for p in [
        (0, -18, -39),
    ]]
    chamfer(f13_2_edges, length=F13_SIZE)

    # F13#3 (call 3 of 4)
    f13_3_edges = [f1.edges().sort_by_distance(p)[0] for p in [
        (0, -18, 39),
    ]]
    chamfer(f13_3_edges, length=F13_SIZE)

    # F13#4 (call 4 of 4)
    f13_4_edges = [f1.edges().sort_by_distance(p)[0] for p in [
        (-30, -6, 7),
    ]]
    chamfer(f13_4_edges, length=F13_SIZE)

    # F14
    f14_edges = [f1.edges().sort_by_distance(p)[0] for p in [
        (-1.5, -10, 39),
    ]]
    chamfer(f14_edges, length=F14_SIZE)

    # F15 (on face) → F16 (cut)
    with BuildSketch(Plane(origin=(0, 0, 0), x_dir=(-1, 0, 0), z_dir=(0, 1, 0))):
        with BuildLine():
            Line((29.1142693598, 16), (16.25, 16))
            Line((16.25, 16), (16.25, 12))
            Line((16.25, 12), (30, 12))
            Line((30, 12), (30, 14))
            ThreePointArc((30, 14), (29.8661237626, 14.8071296921), (29.4788333281, 15.5278149952))
            Line((29.4788333281, 15.5278149952), (29.1142693598, 16))
        make_face()
        with BuildLine():
            Line((20.5, 15.25), (27.5, 15.25))
            ThreePointArc((27.5, 15.25), (28.75, 14), (27.5, 12.75))
            Line((27.5, 12.75), (20.5, 12.75))
            ThreePointArc((20.5, 12.75), (19.25, 14), (20.5, 15.25))
        make_face(mode=Mode.SUBTRACT)
        with Locations((23.125, 8)):
            Rectangle(F15_W, F15_H)
        with BuildLine():
            Line((27.5, 6.75), (20.5, 6.75))
            ThreePointArc((20.5, 6.75), (19.25, 8), (20.5, 9.25))
            Line((20.5, 9.25), (27.5, 9.25))
            ThreePointArc((27.5, 9.25), (28.75, 8), (27.5, 6.75))
        make_face(mode=Mode.SUBTRACT)
    extrude(amount=-F16_DEPTH, mode=Mode.SUBTRACT)


solid = f1.part
